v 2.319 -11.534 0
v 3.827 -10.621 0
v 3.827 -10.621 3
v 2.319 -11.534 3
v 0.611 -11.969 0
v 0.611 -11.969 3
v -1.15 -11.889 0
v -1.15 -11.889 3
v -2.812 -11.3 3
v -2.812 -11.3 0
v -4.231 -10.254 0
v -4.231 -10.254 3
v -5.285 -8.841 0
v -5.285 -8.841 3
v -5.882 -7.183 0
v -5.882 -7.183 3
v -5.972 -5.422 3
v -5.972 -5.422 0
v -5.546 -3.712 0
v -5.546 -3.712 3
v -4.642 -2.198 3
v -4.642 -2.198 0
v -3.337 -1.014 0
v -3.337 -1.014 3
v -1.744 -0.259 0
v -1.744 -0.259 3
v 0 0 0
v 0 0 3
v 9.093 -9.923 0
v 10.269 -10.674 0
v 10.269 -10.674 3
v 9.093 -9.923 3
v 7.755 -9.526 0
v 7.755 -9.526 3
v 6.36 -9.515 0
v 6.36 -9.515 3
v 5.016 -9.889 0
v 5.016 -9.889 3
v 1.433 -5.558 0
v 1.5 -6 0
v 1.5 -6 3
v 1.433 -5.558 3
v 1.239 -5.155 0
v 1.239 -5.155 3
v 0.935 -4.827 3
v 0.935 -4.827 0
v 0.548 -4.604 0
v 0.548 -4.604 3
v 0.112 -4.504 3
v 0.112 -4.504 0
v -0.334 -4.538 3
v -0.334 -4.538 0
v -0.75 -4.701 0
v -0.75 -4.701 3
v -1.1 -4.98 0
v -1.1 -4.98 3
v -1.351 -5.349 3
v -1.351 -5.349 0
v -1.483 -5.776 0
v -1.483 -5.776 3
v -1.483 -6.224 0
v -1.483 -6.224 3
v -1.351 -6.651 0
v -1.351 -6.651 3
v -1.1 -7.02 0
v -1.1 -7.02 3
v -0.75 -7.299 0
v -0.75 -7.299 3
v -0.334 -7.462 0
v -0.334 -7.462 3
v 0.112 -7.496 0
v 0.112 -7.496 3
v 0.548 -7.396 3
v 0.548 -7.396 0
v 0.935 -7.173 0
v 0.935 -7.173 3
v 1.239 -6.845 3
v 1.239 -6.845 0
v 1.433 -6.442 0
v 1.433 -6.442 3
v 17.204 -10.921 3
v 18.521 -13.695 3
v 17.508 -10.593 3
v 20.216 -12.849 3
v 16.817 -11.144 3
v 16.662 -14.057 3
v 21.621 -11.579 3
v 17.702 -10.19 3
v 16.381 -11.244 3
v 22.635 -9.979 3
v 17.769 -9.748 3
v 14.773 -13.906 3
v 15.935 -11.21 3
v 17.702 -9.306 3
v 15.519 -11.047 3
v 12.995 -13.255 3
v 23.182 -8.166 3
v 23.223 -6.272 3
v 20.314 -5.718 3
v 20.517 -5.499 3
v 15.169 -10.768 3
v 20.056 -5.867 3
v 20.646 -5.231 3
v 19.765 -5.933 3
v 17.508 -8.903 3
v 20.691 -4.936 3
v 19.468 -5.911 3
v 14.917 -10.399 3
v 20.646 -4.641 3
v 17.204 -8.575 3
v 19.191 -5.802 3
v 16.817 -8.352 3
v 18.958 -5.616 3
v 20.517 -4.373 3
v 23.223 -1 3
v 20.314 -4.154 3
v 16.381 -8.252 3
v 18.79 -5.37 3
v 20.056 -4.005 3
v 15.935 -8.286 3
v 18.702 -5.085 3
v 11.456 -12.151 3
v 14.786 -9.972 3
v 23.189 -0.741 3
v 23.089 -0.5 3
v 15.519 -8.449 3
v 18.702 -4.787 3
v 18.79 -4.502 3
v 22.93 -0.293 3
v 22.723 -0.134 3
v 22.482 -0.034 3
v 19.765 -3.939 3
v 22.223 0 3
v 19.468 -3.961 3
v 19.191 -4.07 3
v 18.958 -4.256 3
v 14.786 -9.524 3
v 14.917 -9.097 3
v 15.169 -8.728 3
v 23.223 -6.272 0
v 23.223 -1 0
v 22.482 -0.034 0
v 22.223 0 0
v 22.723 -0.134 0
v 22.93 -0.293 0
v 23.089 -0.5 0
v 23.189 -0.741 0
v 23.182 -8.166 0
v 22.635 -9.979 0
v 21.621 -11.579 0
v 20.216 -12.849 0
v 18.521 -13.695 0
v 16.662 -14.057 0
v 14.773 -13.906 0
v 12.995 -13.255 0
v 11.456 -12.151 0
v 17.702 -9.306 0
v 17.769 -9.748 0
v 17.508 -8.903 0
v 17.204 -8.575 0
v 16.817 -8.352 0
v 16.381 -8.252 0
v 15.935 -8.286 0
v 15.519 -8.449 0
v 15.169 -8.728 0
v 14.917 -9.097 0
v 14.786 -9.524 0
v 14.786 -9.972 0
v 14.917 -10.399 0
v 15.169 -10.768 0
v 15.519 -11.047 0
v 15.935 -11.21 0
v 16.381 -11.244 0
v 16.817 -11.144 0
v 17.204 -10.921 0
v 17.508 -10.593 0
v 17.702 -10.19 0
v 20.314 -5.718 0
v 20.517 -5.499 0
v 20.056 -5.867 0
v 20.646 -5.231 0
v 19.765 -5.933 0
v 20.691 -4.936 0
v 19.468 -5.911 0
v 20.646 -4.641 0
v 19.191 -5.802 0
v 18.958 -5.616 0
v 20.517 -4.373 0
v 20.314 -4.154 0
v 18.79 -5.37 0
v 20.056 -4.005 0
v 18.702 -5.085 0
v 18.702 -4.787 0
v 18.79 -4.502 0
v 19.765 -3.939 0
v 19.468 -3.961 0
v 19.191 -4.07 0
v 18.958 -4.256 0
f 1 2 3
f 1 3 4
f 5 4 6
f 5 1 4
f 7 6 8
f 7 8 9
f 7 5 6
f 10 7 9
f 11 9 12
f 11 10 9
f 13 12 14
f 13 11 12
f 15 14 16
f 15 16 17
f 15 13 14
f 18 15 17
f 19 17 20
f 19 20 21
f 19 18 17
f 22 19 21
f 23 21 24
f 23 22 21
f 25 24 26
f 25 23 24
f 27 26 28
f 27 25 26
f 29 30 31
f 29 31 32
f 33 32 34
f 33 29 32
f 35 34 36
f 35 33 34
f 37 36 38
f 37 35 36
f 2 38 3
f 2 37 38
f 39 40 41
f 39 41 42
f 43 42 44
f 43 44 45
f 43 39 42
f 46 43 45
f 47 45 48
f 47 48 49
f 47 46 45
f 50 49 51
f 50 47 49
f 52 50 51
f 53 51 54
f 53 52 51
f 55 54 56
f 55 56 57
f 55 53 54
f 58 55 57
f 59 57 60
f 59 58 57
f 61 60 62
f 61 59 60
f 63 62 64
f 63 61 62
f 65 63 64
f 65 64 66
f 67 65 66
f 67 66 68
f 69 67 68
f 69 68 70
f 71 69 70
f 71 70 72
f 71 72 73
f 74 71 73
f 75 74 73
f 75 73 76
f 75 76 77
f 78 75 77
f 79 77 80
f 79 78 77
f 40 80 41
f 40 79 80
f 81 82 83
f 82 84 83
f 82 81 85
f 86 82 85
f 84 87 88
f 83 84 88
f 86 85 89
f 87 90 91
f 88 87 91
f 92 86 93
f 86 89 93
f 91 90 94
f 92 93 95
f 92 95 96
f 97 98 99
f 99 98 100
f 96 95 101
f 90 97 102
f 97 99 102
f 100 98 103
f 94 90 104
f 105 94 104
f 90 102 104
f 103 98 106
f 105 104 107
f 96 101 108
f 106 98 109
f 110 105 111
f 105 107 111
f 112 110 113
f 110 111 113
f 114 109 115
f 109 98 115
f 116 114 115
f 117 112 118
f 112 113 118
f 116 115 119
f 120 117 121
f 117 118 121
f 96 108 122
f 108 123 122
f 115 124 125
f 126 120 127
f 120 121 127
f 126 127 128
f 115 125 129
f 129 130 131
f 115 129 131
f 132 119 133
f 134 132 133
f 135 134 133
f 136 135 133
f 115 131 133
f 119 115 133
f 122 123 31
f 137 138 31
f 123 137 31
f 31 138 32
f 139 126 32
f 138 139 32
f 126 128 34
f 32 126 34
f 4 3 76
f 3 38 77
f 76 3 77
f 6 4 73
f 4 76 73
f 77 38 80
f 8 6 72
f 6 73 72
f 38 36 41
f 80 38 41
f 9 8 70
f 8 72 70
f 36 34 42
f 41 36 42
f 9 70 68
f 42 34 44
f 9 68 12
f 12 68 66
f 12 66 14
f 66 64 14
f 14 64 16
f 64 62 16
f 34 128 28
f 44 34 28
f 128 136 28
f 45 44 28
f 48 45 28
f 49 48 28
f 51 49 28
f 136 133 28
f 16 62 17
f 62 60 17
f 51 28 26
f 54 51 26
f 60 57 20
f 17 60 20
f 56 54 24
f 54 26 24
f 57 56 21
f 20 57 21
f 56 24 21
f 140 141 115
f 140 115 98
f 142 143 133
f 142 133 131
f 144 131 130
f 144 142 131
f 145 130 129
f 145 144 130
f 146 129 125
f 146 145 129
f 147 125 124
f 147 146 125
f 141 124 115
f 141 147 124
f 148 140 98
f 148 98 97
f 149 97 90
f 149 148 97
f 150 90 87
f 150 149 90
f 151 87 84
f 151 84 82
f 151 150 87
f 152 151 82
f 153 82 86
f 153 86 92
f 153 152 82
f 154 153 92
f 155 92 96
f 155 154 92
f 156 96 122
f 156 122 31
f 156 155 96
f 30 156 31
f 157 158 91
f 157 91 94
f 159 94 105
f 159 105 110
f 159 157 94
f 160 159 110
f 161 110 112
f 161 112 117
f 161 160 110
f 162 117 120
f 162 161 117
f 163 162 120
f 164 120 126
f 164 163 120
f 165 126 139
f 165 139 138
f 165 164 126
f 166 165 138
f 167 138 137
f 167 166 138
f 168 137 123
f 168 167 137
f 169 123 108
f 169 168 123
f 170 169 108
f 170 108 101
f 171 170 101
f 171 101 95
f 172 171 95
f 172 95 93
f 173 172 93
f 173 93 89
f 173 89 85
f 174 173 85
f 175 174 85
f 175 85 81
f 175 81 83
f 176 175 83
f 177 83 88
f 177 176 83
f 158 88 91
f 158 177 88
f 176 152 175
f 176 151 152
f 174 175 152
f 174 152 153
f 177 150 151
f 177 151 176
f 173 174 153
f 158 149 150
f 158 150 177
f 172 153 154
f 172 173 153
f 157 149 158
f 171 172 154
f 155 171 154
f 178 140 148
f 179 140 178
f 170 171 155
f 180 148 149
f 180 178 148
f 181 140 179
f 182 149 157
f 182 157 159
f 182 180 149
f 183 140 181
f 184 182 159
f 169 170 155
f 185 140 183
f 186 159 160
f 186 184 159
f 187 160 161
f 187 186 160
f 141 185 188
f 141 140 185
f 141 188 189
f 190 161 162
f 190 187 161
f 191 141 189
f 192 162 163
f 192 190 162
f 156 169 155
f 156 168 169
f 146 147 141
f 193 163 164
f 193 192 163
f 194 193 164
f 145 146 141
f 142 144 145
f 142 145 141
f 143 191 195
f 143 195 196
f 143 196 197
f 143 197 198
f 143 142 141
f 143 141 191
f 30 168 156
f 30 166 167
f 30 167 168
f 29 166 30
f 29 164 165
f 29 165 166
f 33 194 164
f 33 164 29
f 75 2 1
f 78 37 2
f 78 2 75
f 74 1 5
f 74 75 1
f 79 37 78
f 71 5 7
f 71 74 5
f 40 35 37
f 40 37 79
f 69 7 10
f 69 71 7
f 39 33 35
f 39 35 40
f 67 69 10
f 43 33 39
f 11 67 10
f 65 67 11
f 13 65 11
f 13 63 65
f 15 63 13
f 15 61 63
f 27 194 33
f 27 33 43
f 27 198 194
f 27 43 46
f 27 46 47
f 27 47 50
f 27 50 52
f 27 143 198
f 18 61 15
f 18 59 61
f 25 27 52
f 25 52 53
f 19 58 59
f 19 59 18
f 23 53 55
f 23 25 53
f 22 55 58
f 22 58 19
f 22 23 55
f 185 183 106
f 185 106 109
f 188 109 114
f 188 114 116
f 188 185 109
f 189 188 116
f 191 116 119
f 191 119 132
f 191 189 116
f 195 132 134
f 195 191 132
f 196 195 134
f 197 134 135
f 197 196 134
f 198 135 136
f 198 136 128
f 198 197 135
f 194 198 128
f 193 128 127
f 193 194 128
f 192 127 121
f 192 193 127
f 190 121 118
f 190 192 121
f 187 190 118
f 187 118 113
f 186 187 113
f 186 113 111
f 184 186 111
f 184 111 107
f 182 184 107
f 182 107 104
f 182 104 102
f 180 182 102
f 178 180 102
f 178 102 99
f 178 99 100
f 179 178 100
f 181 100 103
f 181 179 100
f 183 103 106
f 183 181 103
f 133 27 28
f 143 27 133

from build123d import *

# Parameters (mm, degrees)
SKETCH1_R           = 1.5
SKETCH1_R_2         = 1
BOSS_EXTRUDE1_DEPTH = 3


with BuildPart() as part:
    # Sketch1 → Boss-Extrude1 (new body)
    with BuildSketch(Plane.XY):
        with BuildLine():
            Line((0, 0), (22, 0))
            Line((22, 0), (22.223388106, 0))
            ThreePointArc((22.223388106, 0), (22.930494887, -0.292893219), (23.223388106, -1))
            Line((23.223388106, -1), (23.223388106, -6.271970615))
            ThreePointArc((23.223388106, -6.271970615), (18.521001308, -13.695477275), (10.2692294, -10.674028436))
            ThreePointArc((10.2692294, -10.674028436), (7.057961936, -9.471675777), (3.827272257, -10.620821039))
            ThreePointArc((3.827272257, -10.620821039), (-5.644684501, -8.034093627), (0, 0))
        make_face()
        with Locations((0, -6)):
            Circle(SKETCH1_R, mode=Mode.SUBTRACT)
        with Locations((19.690645816, -4.936162338)):
            Circle(SKETCH1_R_2, mode=Mode.SUBTRACT)
        with Locations((16.268762771, -9.747966239)):
            Circle(SKETCH1_R, mode=Mode.SUBTRACT)
    extrude(amount=BOSS_EXTRUDE1_DEPTH)


solid = part.part
